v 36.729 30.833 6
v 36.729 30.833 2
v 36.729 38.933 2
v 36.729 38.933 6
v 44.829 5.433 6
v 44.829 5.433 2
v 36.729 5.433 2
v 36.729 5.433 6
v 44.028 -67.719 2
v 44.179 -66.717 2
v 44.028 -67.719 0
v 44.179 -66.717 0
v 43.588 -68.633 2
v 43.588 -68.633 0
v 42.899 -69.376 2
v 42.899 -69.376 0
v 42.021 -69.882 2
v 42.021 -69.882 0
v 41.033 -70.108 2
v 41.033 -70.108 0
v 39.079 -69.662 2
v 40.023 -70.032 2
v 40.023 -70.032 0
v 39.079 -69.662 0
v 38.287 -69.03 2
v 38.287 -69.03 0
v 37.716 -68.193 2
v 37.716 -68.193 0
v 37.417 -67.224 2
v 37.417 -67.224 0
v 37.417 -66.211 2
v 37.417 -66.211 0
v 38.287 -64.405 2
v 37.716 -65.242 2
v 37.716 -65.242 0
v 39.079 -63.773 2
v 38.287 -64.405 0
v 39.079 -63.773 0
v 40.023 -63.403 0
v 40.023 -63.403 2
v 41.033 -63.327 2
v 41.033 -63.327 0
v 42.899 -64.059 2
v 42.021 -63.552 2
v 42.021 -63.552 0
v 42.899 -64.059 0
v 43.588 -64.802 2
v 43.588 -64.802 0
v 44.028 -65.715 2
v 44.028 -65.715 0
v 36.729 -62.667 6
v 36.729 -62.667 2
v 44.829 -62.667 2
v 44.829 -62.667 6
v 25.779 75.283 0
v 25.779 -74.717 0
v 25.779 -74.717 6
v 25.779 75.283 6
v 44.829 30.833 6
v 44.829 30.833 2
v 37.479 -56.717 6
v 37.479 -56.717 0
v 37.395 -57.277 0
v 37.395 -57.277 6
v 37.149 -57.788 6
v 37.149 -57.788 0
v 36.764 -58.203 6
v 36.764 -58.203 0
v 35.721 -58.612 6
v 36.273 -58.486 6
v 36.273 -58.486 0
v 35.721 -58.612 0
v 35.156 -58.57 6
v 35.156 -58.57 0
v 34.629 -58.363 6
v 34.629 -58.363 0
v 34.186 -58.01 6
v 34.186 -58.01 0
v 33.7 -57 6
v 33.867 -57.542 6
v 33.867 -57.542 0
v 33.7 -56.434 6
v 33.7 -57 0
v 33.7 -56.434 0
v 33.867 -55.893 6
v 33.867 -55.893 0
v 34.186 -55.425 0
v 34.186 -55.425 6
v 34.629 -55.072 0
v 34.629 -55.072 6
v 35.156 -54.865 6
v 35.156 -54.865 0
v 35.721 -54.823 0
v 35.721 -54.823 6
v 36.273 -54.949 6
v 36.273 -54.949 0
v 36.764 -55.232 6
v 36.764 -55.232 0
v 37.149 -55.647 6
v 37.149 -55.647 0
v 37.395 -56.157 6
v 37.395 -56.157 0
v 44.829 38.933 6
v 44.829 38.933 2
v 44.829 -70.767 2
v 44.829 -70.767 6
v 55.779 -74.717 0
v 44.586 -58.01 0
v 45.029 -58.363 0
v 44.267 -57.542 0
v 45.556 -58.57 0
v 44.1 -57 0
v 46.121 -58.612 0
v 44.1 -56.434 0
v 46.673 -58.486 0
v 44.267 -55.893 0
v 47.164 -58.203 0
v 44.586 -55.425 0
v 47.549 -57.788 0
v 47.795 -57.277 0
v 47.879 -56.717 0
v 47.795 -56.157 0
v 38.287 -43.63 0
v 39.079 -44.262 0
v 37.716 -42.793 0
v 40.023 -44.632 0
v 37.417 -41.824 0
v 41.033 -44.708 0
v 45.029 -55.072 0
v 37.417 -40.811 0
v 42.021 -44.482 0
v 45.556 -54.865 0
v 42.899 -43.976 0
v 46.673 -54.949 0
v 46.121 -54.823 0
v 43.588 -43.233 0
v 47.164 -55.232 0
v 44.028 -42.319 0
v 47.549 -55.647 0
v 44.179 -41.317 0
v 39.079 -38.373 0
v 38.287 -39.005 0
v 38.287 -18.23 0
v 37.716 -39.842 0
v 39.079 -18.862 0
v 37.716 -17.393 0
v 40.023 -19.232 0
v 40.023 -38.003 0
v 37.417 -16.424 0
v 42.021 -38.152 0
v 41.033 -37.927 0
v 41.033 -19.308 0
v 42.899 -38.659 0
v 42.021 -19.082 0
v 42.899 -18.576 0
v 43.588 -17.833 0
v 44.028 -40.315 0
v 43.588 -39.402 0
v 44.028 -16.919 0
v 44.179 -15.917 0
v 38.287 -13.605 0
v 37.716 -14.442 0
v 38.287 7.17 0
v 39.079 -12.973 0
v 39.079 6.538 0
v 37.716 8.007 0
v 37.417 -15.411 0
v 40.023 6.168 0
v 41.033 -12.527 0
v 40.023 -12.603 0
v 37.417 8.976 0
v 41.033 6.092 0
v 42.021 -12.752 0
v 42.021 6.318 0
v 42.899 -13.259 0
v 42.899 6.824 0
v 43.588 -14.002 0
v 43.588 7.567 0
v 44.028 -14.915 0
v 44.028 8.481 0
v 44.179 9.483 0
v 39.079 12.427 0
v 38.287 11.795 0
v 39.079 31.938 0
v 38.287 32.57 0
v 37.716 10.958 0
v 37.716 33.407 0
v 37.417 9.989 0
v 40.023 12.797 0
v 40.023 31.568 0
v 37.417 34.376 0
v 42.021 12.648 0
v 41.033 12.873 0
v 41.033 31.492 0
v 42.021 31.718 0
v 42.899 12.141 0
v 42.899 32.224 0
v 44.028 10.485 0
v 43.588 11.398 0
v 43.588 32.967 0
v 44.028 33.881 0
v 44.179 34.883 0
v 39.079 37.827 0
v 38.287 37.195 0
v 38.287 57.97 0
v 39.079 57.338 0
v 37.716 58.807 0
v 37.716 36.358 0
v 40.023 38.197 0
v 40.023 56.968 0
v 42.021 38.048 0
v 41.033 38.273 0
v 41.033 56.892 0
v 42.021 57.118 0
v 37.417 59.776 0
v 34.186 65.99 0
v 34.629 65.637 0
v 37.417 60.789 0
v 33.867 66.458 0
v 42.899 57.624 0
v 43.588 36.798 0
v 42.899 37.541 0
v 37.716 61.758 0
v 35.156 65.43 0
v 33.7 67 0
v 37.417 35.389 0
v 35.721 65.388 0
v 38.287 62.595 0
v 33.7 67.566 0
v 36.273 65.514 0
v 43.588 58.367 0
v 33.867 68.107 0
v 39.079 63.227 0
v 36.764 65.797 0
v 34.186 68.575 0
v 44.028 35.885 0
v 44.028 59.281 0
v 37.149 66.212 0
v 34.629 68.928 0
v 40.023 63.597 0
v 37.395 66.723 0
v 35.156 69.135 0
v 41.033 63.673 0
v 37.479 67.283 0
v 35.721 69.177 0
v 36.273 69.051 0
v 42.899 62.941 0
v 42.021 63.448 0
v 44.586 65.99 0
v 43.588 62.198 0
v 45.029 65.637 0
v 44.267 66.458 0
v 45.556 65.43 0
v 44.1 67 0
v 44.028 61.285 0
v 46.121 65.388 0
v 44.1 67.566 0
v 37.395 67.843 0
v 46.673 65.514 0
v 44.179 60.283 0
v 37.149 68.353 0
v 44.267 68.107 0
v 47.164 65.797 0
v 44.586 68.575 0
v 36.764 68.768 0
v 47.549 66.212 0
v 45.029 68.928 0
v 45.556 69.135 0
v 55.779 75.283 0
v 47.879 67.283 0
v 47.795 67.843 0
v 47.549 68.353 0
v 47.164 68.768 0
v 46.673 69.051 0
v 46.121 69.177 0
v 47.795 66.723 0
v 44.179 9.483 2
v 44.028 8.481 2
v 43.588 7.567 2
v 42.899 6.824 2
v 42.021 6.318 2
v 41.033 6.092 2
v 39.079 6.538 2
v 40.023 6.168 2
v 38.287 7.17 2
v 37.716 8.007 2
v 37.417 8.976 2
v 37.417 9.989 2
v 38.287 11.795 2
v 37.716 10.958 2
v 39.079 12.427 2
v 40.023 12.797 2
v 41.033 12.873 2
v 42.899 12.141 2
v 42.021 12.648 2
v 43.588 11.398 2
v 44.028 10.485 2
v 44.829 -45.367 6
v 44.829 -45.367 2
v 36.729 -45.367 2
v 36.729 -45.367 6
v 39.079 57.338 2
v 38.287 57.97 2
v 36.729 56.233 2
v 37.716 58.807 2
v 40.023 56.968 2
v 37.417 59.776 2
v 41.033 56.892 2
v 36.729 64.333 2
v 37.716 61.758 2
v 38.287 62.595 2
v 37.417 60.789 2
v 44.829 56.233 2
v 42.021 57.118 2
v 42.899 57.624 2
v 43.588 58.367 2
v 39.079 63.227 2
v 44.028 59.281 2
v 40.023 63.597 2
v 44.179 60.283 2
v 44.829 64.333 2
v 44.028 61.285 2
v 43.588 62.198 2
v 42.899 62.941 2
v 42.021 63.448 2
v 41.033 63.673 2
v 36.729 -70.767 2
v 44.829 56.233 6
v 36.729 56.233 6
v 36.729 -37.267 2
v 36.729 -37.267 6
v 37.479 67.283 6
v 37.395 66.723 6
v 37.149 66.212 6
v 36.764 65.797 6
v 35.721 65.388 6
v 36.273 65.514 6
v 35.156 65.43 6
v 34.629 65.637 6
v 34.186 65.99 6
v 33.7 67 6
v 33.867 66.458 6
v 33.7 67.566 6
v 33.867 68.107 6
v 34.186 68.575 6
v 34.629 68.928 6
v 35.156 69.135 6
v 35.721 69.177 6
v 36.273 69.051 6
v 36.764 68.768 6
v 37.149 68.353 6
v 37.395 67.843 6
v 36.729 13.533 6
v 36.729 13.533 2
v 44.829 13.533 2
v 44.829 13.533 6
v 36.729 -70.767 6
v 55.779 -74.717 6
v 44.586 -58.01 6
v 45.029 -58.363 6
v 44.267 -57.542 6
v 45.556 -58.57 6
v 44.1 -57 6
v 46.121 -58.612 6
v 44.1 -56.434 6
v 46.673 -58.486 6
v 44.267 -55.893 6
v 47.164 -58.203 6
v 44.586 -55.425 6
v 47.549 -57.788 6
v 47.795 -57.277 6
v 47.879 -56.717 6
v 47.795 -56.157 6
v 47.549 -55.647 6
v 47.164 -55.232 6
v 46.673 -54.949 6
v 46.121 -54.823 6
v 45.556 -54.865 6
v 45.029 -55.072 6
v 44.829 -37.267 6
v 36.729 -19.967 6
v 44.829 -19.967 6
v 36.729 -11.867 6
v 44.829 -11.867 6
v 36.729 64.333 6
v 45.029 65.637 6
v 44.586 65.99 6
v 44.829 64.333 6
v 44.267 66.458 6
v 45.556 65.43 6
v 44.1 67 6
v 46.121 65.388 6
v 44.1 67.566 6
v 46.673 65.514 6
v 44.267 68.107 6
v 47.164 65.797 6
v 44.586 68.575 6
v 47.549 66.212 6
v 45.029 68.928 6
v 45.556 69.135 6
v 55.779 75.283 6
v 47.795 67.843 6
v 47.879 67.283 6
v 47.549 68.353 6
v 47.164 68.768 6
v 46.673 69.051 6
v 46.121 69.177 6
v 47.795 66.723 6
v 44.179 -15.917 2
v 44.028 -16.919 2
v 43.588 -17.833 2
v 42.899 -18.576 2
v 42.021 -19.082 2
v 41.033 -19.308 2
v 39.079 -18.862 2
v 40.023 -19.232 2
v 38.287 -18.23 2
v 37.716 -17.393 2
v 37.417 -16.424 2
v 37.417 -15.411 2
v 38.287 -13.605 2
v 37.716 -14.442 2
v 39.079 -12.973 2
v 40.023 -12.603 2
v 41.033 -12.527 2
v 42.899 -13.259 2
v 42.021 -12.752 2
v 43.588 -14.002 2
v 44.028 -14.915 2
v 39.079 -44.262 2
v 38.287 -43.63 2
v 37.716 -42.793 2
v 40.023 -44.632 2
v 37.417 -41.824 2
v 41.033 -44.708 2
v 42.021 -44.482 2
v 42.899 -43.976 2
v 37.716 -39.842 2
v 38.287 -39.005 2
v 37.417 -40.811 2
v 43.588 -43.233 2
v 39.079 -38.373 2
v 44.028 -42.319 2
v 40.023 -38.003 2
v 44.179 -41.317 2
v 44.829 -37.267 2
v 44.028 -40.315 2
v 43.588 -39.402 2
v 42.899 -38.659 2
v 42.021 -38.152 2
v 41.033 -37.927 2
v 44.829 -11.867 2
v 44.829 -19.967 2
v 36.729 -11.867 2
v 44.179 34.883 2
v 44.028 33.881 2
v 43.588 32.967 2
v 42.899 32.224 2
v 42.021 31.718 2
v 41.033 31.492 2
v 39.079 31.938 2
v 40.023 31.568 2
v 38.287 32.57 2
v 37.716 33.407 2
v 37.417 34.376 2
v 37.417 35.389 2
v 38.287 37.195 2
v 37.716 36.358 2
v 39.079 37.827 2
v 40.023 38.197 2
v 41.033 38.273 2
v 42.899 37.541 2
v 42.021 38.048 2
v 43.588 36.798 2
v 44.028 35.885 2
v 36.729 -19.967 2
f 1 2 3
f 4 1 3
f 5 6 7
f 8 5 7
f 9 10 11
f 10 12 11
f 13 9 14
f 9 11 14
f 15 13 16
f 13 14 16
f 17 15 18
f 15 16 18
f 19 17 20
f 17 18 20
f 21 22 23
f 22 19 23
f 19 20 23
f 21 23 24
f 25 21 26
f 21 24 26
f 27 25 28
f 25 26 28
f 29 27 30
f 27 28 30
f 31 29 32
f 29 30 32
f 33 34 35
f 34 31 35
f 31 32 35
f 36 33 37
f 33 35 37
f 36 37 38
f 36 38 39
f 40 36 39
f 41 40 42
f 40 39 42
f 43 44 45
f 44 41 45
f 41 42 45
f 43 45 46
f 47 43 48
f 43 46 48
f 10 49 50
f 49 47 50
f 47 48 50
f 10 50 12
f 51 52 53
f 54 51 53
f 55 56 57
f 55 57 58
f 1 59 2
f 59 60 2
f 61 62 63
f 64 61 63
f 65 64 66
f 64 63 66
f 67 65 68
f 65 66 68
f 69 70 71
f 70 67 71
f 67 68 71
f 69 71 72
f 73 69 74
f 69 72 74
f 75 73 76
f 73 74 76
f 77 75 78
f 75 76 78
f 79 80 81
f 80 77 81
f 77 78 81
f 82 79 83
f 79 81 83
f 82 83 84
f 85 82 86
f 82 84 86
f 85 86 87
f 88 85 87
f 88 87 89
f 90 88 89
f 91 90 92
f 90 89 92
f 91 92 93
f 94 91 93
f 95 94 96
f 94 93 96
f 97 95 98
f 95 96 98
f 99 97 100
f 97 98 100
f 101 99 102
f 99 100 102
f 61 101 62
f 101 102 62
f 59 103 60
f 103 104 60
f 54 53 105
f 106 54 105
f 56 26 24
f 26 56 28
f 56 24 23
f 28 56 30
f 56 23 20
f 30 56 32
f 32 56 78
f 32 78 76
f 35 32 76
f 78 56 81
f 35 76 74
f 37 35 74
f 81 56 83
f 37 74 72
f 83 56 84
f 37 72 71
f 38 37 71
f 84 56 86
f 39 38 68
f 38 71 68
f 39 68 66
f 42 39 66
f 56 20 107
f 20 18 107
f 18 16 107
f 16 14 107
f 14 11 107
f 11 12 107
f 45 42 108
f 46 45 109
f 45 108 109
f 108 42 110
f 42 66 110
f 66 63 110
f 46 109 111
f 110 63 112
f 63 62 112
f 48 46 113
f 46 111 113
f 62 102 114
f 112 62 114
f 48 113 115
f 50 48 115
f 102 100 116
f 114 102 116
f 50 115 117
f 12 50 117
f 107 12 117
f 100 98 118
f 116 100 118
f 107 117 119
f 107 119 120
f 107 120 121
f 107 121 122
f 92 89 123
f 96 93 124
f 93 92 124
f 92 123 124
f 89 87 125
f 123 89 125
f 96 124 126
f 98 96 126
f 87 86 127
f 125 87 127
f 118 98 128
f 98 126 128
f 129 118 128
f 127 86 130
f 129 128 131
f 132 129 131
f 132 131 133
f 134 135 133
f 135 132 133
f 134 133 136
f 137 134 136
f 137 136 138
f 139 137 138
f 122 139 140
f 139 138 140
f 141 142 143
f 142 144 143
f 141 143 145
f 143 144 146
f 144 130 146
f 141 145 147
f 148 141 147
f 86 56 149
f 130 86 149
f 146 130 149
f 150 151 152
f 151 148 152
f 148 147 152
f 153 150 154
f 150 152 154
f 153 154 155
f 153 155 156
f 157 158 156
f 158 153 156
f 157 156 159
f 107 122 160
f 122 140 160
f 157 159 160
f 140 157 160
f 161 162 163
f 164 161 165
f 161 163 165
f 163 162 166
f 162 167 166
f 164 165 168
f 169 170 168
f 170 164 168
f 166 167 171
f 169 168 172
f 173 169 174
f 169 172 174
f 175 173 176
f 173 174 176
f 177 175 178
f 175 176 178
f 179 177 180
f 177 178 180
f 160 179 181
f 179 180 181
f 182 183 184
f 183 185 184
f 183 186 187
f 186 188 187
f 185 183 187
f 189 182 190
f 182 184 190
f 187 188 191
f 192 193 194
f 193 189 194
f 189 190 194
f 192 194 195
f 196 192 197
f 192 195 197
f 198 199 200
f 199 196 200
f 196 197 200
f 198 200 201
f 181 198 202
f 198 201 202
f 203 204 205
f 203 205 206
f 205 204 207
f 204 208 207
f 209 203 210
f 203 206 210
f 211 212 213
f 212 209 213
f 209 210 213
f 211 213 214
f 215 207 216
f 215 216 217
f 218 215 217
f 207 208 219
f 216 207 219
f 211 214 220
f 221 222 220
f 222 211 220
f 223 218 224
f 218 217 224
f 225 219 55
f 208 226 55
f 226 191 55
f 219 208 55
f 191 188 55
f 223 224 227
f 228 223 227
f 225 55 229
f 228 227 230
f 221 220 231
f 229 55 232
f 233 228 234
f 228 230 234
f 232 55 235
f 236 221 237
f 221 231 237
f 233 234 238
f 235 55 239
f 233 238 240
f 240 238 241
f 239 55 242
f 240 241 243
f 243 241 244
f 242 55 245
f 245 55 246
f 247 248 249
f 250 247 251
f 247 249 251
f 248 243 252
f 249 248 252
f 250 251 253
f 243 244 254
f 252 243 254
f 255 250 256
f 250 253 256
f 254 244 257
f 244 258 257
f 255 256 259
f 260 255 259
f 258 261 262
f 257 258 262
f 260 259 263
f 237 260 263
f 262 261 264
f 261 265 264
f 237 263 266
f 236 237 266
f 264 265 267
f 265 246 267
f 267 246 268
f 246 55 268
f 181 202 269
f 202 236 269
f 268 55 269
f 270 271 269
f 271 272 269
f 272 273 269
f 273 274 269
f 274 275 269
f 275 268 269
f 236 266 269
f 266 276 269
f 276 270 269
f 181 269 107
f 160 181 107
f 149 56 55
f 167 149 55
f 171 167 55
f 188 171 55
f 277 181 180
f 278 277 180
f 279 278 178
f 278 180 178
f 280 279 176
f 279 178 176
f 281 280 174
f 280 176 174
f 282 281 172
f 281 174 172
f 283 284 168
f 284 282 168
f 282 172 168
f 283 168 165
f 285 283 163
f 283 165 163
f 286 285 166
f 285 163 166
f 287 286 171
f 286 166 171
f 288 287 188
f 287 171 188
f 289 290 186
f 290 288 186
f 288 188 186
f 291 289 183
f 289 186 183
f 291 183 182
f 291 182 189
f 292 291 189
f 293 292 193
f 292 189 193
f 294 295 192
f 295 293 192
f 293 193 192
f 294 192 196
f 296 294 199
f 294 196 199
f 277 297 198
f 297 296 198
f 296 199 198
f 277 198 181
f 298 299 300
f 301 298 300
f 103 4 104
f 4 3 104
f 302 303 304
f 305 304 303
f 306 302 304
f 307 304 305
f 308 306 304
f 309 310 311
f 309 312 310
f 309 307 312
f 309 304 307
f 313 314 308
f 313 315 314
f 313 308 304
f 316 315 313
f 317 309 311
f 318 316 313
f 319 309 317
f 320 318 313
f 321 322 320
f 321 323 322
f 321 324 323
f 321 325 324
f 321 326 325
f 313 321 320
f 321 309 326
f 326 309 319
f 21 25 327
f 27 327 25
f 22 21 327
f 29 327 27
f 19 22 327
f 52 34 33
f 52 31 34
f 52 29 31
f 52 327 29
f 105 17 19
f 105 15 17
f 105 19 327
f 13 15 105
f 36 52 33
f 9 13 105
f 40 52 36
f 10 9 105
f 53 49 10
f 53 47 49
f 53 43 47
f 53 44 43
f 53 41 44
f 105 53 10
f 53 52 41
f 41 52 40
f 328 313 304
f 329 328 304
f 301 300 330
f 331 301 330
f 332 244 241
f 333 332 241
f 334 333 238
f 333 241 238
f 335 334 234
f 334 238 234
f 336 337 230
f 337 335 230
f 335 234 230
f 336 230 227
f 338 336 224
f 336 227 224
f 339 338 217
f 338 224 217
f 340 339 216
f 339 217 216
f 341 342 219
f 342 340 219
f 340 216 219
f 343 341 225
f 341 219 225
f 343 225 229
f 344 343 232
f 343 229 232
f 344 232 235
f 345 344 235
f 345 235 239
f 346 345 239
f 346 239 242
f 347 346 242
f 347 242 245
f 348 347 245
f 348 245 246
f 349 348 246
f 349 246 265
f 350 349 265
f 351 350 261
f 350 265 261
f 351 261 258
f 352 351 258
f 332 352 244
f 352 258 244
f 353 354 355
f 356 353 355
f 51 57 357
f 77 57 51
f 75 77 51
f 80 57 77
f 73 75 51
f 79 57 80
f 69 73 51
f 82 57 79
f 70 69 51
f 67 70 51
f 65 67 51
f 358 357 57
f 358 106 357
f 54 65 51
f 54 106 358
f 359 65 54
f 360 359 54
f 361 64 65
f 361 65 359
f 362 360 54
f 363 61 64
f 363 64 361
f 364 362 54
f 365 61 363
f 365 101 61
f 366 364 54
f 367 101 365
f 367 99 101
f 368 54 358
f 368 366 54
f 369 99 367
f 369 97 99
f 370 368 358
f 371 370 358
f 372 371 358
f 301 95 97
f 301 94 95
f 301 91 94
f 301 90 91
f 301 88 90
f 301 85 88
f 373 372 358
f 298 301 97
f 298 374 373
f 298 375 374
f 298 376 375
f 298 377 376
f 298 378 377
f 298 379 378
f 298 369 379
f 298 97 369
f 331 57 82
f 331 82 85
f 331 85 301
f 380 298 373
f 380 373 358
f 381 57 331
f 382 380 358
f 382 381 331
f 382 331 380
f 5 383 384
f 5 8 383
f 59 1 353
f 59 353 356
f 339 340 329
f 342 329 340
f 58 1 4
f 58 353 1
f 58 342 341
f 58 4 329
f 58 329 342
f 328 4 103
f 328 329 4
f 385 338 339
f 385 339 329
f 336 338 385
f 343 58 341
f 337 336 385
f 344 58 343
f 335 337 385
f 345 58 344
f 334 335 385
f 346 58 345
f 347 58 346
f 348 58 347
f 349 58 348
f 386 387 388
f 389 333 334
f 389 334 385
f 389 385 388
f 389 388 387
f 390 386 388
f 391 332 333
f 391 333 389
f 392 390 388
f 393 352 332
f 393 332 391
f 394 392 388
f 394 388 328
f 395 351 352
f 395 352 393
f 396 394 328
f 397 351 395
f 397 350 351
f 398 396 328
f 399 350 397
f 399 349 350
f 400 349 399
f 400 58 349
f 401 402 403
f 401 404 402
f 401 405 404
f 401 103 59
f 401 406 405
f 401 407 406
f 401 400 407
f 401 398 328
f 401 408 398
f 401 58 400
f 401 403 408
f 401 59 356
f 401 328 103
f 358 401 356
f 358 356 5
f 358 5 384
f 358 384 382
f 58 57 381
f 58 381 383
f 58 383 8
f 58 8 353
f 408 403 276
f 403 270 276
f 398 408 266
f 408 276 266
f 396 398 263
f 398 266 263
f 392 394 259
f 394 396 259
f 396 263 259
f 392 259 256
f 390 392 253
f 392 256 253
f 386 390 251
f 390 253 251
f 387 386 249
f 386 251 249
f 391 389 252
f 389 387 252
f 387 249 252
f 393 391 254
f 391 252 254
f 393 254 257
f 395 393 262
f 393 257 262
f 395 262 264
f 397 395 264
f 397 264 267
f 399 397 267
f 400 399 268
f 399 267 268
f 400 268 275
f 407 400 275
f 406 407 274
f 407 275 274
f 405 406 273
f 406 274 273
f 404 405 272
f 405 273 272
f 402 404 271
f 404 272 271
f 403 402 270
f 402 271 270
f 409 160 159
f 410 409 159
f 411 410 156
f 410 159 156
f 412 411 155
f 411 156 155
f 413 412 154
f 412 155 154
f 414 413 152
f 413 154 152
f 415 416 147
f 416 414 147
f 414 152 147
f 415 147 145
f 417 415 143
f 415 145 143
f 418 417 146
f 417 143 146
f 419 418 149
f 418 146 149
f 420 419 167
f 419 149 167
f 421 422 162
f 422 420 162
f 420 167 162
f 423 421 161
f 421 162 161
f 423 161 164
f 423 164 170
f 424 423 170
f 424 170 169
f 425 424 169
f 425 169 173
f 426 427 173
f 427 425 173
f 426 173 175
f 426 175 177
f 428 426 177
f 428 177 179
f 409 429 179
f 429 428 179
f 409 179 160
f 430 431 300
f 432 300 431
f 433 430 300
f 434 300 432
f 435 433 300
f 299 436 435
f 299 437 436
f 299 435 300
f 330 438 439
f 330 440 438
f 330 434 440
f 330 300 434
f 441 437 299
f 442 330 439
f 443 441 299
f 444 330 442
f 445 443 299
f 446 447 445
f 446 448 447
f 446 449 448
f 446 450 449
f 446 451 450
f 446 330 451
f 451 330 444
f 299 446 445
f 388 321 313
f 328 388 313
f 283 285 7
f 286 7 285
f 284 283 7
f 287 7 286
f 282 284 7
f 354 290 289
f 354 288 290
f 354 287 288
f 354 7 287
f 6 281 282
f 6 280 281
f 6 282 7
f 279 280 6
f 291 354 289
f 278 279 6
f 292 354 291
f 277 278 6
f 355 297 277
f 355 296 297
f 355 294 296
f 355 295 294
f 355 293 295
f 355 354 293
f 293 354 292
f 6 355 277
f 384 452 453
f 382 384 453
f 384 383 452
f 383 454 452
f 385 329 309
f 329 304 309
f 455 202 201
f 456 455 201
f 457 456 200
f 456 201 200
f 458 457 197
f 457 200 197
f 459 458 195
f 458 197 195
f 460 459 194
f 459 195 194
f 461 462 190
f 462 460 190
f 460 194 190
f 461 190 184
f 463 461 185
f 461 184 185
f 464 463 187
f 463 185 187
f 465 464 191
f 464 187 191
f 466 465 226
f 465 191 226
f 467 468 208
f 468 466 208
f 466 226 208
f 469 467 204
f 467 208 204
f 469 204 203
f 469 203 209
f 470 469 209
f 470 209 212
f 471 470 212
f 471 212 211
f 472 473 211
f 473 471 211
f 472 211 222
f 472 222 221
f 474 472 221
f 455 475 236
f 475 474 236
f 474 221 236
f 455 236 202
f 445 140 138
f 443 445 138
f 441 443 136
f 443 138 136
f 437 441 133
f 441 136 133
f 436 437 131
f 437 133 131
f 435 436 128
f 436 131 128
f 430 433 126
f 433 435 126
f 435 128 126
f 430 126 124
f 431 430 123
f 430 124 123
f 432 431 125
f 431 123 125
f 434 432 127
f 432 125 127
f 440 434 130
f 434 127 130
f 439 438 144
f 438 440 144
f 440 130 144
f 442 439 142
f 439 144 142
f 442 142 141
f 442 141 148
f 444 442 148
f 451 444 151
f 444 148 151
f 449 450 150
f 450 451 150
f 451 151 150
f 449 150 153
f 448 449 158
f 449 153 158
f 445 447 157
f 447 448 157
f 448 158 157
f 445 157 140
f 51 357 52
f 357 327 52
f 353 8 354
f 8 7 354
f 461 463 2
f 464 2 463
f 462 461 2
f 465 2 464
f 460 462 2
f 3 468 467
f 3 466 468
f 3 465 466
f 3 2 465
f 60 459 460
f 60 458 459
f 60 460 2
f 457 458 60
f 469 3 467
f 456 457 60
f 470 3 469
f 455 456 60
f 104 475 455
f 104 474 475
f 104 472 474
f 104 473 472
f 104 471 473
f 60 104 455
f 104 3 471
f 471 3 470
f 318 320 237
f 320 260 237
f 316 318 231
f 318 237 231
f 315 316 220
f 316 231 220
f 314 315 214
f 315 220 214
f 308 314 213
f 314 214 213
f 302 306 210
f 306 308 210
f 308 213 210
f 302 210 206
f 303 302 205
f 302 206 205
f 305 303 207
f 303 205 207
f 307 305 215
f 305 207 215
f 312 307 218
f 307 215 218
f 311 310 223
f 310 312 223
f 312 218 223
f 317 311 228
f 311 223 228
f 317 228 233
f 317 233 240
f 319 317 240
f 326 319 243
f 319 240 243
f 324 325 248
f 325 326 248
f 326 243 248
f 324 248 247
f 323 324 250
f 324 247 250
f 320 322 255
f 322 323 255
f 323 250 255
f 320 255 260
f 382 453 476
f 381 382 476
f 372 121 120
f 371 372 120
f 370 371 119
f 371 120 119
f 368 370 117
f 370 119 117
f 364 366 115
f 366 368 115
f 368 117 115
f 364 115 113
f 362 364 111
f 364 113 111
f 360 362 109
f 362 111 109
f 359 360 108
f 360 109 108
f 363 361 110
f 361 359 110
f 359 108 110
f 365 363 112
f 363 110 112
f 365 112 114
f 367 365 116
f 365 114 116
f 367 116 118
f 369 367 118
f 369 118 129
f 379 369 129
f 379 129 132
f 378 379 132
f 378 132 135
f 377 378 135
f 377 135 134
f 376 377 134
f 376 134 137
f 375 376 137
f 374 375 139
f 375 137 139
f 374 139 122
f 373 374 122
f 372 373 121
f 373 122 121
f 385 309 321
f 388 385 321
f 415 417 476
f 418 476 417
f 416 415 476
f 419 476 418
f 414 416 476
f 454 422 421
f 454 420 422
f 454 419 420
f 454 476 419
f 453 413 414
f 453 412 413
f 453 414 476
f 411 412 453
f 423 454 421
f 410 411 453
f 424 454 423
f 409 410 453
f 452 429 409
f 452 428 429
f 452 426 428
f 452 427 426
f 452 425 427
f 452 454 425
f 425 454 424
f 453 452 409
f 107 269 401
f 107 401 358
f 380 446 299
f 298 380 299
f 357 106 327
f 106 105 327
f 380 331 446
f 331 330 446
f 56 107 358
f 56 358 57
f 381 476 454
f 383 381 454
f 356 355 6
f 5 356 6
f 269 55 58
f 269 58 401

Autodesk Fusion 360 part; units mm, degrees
sketch "Schizzo1" plane through (0, 0, 0) normal (0, 0, 1) x (1, 0, 0)
  line L0 (25.7791, 75.2827) -> (55.7791, 75.2827)
  line L1 (55.7791, 75.2827) -> (55.7791, -74.7173)
  line L2 (55.7791, -74.7173) -> (25.7791, -74.7173)
  line L3 (25.7791, -74.7173) -> (25.7791, 75.2827)
  line L4 (40.7791, 75.2827) -> (40.7791, -74.7173) construction
  line L5 (25.7791, 0.2827) -> (55.7791, 0.2827) construction
  circle A0 centre (40.7791, 60.2827) radius 3.4
  line L6 (44.8291, 56.2327) -> (36.7291, 56.2327)
  line L7 (36.7291, 56.2327) -> (36.7291, 64.3327)
  line L8 (36.7291, 64.3327) -> (44.8291, 64.3327)
  line L9 (44.8291, 64.3327) -> (44.8291, 56.2327)
  line L10 (44.8291, 56.2327) -> (36.7291, 64.3327) construction
  line L11 (36.7291, 56.2327) -> (44.8291, 64.3327) construction
  line L12 (44.8291, 38.9327) -> (44.8291, 30.8327)
  line L13 (36.7291, 38.9327) -> (44.8291, 38.9327)
  line L14 (36.7291, 30.8327) -> (36.7291, 38.9327)
  circle A1 centre (40.7791, 34.8827) radius 3.4
  line L15 (44.8291, 30.8327) -> (36.7291, 30.8327)
  line L16 (44.8291, 13.5327) -> (44.8291, 5.4327)
  line L17 (36.7291, 13.5327) -> (44.8291, 13.5327)
  line L18 (36.7291, 5.4327) -> (36.7291, 13.5327)
  circle A2 centre (40.7791, 9.4827) radius 3.4
  line L19 (44.8291, 5.4327) -> (36.7291, 5.4327)
  line L20 (44.8291, -11.8673) -> (44.8291, -19.9673)
  line L21 (36.7291, -11.8673) -> (44.8291, -11.8673)
  line L22 (36.7291, -19.9673) -> (36.7291, -11.8673)
  circle A3 centre (40.7791, -15.9173) radius 3.4
  line L23 (44.8291, -19.9673) -> (36.7291, -19.9673)
  line L24 (44.8291, -37.2673) -> (44.8291, -45.3673)
  line L25 (36.7291, -37.2673) -> (44.8291, -37.2673)
  line L26 (36.7291, -45.3673) -> (36.7291, -37.2673)
  circle A4 centre (40.7791, -41.3173) radius 3.4
  line L27 (44.8291, -45.3673) -> (36.7291, -45.3673)
  line L28 (44.8291, -62.6673) -> (44.8291, -70.7673)
  line L29 (36.7291, -62.6673) -> (44.8291, -62.6673)
  line L30 (36.7291, -70.7673) -> (36.7291, -62.6673)
  circle A5 centre (40.7791, -66.7173) radius 3.4
  line L31 (44.8291, -70.7673) -> (36.7291, -70.7673)
  line L32 (35.5791, 75.2827) -> (35.5791, -74.7173) construction
  circle A6 centre (35.5791, 67.2827) radius 1.9
  circle A7 centre (45.9791, 67.2827) radius 1.9
  circle A8 centre (35.5791, -56.7173) radius 1.9
  circle A9 centre (45.9791, -56.7173) radius 1.9
  point P0 (40.7791, 60.2827)
  dimension "d1" = 30
  dimension "d2" = 150
  dimension "d3" = 6.8
  dimension "d4" = 8.1
  dimension "d5" = 8.1
  dimension "d8" = 25.4
  dimension "d9" = 0
  dimension "d11" = 15
  dimension "d22" = 5.2
  dimension "d23" = 3.8
  dimension "d24" = 8
  dimension "d27" = 124
  dimension "d28" = 0
  dimension "d29" = 25.4
  dimension "d30" = 124
extrude "Estrusione1" add sketch "Schizzo1" along normal blind 6 contours L0 L1 L2 L3
extrude "Estrusione2" add sketch "Schizzo1" along normal blind 2 contours L6 L7 L8 L9 | L12 L13 L14 L15 | L16 L17 L18 L19 | L20 L21 L22 L23 | L24 L25 L26 L27 | L28 L29 L30 L31
